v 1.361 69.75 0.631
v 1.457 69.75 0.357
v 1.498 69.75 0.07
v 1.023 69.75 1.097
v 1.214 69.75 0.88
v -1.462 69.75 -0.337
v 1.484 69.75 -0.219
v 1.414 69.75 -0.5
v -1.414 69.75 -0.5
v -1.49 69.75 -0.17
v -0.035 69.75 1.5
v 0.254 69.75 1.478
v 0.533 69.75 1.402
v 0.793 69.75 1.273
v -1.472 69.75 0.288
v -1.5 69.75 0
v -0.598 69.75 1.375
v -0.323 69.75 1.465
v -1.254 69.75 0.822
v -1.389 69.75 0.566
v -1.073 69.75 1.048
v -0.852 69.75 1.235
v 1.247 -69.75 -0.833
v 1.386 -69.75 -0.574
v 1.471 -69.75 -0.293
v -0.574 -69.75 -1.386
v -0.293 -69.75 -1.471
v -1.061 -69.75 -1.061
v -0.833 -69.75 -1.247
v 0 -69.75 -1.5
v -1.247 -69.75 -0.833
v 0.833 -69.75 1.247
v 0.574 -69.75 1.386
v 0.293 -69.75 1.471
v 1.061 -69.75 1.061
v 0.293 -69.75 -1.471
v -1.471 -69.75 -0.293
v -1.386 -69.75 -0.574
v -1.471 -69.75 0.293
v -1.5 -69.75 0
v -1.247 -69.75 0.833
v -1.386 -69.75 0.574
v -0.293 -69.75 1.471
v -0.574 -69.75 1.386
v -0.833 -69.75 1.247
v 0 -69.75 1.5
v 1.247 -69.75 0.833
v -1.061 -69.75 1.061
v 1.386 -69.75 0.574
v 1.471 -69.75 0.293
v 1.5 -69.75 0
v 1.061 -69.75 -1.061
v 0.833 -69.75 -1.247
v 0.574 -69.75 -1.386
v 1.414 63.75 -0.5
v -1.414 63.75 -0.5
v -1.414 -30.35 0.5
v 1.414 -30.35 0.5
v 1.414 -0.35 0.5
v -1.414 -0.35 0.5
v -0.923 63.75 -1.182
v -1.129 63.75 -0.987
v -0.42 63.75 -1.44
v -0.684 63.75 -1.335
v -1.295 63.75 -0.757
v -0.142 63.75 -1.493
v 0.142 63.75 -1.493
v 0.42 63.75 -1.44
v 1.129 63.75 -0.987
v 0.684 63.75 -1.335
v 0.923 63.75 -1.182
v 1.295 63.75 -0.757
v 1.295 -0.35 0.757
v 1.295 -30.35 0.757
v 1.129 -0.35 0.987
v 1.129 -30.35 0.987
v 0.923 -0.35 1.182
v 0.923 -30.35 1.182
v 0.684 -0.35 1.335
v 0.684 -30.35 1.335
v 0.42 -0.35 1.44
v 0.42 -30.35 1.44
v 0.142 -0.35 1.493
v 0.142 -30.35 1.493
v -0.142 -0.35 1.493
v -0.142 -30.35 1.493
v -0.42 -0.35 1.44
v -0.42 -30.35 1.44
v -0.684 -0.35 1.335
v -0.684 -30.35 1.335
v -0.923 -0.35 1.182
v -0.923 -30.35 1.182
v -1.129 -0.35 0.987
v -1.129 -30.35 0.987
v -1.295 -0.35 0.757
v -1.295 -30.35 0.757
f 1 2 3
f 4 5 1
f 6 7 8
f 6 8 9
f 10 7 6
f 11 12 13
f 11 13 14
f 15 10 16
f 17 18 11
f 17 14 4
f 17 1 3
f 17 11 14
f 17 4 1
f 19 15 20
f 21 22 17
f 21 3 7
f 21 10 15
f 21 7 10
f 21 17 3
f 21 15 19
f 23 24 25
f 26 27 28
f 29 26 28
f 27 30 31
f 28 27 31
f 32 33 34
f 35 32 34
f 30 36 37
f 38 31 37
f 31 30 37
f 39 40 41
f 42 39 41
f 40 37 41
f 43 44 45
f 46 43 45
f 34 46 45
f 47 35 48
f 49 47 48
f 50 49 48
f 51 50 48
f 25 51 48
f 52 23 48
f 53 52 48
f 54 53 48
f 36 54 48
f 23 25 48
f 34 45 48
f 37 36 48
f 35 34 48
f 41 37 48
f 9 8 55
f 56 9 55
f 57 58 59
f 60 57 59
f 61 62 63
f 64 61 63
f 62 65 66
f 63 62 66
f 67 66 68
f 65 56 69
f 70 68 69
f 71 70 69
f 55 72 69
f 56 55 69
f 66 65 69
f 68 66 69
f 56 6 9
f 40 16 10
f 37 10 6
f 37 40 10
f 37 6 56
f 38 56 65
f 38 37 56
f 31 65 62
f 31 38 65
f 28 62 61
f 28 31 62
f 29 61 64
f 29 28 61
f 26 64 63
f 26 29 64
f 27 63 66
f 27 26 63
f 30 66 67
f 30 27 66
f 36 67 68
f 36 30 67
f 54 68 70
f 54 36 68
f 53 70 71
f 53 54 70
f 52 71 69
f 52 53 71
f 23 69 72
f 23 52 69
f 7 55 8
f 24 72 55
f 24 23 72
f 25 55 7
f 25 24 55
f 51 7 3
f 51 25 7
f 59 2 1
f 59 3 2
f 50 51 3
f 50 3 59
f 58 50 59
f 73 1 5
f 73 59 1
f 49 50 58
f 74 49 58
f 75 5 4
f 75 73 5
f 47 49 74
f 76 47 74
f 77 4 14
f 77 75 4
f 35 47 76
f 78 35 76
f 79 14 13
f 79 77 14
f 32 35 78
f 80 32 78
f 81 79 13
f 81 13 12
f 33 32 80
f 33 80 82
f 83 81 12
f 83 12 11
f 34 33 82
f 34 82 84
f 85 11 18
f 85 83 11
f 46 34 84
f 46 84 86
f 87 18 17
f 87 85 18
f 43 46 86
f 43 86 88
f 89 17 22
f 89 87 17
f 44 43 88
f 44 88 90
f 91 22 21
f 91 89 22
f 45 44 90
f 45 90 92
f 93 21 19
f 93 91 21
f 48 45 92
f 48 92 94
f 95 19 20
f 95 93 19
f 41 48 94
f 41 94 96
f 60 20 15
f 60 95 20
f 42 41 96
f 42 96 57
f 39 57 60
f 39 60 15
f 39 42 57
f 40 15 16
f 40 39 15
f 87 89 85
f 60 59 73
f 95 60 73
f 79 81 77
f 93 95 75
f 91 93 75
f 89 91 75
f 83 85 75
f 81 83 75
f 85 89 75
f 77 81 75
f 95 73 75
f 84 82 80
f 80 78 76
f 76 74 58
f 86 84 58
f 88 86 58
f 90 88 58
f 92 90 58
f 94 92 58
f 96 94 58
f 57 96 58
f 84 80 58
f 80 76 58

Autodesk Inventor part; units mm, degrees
ref_plane "YZ Plane" through (0, 0, 0) normal (1, 0, 0) x (0, 1, 0)
ref_plane "XZ Plane" through (0, 0, 0) normal (0, 1, 0) x (-1, 0, 0)
ref_plane "XY Plane" through (0, 0, 0) normal (0, 0, 1) x (1, 0, 0)
sketch "Sketch4" plane through (0, 0, 0) normal (0, 1, 0) x (-1, 0, 0)
  circle A0 centre (0, 0) radius 1.5
extrude "Extrusion2" add sketch "Sketch4" along normal mid plane 139.5
sketch "Sketch13" plane through (0, 0, 0) normal (1, 0, 0) x (0, 1, 0)
  line L0 (70.3754, -0.5) -> (63.75, -0.5)
  line L1 (63.75, -0.5) -> (63.75, -2.4686)
  line L2 (63.75, -2.4686) -> (70.3754, -2.4686)
  line L3 (70.3754, -2.4686) -> (70.3754, -0.5)
  line L4 (-69.75, -1.5) -> (69.75, -1.5) projected
  line L5 (69.75, -1.5) -> (69.75, 1.5) projected
  line L6 (-0.35, 2.5026) -> (-30.35, 2.5026)
  line L7 (-30.35, 2.5026) -> (-30.35, 0.5)
  line L8 (-30.35, 0.5) -> (-0.35, 0.5)
  line L9 (-0.35, 0.5) -> (-0.35, 2.5026)
  line L10 (-69.75, 1.5) -> (69.75, 1.5) projected
  line L11 (-69.75, 1.5) -> (-69.75, -1.5) projected
  point P0 (0, 0)
  point P1 (-0.35, 1.5)
  point P2 (-30.35, 1.5)
  point P3 (69.75, -0.5)
  point P4 (63.75, -1.5)
  dimension "d89" = 1
  dimension "d90" = 6
  dimension "d91" = 1
  dimension "d92" = 30
  dimension "d93" = 39.4
extrude "Extrusion9" cut sketch "Sketch13" against normal through all both and the other way through all contours L5 L4 L1 L0 | L9 L8 L7 L10
properties part number "Wheel Shaft 125mm" material "Bronze, Soft Tin"
